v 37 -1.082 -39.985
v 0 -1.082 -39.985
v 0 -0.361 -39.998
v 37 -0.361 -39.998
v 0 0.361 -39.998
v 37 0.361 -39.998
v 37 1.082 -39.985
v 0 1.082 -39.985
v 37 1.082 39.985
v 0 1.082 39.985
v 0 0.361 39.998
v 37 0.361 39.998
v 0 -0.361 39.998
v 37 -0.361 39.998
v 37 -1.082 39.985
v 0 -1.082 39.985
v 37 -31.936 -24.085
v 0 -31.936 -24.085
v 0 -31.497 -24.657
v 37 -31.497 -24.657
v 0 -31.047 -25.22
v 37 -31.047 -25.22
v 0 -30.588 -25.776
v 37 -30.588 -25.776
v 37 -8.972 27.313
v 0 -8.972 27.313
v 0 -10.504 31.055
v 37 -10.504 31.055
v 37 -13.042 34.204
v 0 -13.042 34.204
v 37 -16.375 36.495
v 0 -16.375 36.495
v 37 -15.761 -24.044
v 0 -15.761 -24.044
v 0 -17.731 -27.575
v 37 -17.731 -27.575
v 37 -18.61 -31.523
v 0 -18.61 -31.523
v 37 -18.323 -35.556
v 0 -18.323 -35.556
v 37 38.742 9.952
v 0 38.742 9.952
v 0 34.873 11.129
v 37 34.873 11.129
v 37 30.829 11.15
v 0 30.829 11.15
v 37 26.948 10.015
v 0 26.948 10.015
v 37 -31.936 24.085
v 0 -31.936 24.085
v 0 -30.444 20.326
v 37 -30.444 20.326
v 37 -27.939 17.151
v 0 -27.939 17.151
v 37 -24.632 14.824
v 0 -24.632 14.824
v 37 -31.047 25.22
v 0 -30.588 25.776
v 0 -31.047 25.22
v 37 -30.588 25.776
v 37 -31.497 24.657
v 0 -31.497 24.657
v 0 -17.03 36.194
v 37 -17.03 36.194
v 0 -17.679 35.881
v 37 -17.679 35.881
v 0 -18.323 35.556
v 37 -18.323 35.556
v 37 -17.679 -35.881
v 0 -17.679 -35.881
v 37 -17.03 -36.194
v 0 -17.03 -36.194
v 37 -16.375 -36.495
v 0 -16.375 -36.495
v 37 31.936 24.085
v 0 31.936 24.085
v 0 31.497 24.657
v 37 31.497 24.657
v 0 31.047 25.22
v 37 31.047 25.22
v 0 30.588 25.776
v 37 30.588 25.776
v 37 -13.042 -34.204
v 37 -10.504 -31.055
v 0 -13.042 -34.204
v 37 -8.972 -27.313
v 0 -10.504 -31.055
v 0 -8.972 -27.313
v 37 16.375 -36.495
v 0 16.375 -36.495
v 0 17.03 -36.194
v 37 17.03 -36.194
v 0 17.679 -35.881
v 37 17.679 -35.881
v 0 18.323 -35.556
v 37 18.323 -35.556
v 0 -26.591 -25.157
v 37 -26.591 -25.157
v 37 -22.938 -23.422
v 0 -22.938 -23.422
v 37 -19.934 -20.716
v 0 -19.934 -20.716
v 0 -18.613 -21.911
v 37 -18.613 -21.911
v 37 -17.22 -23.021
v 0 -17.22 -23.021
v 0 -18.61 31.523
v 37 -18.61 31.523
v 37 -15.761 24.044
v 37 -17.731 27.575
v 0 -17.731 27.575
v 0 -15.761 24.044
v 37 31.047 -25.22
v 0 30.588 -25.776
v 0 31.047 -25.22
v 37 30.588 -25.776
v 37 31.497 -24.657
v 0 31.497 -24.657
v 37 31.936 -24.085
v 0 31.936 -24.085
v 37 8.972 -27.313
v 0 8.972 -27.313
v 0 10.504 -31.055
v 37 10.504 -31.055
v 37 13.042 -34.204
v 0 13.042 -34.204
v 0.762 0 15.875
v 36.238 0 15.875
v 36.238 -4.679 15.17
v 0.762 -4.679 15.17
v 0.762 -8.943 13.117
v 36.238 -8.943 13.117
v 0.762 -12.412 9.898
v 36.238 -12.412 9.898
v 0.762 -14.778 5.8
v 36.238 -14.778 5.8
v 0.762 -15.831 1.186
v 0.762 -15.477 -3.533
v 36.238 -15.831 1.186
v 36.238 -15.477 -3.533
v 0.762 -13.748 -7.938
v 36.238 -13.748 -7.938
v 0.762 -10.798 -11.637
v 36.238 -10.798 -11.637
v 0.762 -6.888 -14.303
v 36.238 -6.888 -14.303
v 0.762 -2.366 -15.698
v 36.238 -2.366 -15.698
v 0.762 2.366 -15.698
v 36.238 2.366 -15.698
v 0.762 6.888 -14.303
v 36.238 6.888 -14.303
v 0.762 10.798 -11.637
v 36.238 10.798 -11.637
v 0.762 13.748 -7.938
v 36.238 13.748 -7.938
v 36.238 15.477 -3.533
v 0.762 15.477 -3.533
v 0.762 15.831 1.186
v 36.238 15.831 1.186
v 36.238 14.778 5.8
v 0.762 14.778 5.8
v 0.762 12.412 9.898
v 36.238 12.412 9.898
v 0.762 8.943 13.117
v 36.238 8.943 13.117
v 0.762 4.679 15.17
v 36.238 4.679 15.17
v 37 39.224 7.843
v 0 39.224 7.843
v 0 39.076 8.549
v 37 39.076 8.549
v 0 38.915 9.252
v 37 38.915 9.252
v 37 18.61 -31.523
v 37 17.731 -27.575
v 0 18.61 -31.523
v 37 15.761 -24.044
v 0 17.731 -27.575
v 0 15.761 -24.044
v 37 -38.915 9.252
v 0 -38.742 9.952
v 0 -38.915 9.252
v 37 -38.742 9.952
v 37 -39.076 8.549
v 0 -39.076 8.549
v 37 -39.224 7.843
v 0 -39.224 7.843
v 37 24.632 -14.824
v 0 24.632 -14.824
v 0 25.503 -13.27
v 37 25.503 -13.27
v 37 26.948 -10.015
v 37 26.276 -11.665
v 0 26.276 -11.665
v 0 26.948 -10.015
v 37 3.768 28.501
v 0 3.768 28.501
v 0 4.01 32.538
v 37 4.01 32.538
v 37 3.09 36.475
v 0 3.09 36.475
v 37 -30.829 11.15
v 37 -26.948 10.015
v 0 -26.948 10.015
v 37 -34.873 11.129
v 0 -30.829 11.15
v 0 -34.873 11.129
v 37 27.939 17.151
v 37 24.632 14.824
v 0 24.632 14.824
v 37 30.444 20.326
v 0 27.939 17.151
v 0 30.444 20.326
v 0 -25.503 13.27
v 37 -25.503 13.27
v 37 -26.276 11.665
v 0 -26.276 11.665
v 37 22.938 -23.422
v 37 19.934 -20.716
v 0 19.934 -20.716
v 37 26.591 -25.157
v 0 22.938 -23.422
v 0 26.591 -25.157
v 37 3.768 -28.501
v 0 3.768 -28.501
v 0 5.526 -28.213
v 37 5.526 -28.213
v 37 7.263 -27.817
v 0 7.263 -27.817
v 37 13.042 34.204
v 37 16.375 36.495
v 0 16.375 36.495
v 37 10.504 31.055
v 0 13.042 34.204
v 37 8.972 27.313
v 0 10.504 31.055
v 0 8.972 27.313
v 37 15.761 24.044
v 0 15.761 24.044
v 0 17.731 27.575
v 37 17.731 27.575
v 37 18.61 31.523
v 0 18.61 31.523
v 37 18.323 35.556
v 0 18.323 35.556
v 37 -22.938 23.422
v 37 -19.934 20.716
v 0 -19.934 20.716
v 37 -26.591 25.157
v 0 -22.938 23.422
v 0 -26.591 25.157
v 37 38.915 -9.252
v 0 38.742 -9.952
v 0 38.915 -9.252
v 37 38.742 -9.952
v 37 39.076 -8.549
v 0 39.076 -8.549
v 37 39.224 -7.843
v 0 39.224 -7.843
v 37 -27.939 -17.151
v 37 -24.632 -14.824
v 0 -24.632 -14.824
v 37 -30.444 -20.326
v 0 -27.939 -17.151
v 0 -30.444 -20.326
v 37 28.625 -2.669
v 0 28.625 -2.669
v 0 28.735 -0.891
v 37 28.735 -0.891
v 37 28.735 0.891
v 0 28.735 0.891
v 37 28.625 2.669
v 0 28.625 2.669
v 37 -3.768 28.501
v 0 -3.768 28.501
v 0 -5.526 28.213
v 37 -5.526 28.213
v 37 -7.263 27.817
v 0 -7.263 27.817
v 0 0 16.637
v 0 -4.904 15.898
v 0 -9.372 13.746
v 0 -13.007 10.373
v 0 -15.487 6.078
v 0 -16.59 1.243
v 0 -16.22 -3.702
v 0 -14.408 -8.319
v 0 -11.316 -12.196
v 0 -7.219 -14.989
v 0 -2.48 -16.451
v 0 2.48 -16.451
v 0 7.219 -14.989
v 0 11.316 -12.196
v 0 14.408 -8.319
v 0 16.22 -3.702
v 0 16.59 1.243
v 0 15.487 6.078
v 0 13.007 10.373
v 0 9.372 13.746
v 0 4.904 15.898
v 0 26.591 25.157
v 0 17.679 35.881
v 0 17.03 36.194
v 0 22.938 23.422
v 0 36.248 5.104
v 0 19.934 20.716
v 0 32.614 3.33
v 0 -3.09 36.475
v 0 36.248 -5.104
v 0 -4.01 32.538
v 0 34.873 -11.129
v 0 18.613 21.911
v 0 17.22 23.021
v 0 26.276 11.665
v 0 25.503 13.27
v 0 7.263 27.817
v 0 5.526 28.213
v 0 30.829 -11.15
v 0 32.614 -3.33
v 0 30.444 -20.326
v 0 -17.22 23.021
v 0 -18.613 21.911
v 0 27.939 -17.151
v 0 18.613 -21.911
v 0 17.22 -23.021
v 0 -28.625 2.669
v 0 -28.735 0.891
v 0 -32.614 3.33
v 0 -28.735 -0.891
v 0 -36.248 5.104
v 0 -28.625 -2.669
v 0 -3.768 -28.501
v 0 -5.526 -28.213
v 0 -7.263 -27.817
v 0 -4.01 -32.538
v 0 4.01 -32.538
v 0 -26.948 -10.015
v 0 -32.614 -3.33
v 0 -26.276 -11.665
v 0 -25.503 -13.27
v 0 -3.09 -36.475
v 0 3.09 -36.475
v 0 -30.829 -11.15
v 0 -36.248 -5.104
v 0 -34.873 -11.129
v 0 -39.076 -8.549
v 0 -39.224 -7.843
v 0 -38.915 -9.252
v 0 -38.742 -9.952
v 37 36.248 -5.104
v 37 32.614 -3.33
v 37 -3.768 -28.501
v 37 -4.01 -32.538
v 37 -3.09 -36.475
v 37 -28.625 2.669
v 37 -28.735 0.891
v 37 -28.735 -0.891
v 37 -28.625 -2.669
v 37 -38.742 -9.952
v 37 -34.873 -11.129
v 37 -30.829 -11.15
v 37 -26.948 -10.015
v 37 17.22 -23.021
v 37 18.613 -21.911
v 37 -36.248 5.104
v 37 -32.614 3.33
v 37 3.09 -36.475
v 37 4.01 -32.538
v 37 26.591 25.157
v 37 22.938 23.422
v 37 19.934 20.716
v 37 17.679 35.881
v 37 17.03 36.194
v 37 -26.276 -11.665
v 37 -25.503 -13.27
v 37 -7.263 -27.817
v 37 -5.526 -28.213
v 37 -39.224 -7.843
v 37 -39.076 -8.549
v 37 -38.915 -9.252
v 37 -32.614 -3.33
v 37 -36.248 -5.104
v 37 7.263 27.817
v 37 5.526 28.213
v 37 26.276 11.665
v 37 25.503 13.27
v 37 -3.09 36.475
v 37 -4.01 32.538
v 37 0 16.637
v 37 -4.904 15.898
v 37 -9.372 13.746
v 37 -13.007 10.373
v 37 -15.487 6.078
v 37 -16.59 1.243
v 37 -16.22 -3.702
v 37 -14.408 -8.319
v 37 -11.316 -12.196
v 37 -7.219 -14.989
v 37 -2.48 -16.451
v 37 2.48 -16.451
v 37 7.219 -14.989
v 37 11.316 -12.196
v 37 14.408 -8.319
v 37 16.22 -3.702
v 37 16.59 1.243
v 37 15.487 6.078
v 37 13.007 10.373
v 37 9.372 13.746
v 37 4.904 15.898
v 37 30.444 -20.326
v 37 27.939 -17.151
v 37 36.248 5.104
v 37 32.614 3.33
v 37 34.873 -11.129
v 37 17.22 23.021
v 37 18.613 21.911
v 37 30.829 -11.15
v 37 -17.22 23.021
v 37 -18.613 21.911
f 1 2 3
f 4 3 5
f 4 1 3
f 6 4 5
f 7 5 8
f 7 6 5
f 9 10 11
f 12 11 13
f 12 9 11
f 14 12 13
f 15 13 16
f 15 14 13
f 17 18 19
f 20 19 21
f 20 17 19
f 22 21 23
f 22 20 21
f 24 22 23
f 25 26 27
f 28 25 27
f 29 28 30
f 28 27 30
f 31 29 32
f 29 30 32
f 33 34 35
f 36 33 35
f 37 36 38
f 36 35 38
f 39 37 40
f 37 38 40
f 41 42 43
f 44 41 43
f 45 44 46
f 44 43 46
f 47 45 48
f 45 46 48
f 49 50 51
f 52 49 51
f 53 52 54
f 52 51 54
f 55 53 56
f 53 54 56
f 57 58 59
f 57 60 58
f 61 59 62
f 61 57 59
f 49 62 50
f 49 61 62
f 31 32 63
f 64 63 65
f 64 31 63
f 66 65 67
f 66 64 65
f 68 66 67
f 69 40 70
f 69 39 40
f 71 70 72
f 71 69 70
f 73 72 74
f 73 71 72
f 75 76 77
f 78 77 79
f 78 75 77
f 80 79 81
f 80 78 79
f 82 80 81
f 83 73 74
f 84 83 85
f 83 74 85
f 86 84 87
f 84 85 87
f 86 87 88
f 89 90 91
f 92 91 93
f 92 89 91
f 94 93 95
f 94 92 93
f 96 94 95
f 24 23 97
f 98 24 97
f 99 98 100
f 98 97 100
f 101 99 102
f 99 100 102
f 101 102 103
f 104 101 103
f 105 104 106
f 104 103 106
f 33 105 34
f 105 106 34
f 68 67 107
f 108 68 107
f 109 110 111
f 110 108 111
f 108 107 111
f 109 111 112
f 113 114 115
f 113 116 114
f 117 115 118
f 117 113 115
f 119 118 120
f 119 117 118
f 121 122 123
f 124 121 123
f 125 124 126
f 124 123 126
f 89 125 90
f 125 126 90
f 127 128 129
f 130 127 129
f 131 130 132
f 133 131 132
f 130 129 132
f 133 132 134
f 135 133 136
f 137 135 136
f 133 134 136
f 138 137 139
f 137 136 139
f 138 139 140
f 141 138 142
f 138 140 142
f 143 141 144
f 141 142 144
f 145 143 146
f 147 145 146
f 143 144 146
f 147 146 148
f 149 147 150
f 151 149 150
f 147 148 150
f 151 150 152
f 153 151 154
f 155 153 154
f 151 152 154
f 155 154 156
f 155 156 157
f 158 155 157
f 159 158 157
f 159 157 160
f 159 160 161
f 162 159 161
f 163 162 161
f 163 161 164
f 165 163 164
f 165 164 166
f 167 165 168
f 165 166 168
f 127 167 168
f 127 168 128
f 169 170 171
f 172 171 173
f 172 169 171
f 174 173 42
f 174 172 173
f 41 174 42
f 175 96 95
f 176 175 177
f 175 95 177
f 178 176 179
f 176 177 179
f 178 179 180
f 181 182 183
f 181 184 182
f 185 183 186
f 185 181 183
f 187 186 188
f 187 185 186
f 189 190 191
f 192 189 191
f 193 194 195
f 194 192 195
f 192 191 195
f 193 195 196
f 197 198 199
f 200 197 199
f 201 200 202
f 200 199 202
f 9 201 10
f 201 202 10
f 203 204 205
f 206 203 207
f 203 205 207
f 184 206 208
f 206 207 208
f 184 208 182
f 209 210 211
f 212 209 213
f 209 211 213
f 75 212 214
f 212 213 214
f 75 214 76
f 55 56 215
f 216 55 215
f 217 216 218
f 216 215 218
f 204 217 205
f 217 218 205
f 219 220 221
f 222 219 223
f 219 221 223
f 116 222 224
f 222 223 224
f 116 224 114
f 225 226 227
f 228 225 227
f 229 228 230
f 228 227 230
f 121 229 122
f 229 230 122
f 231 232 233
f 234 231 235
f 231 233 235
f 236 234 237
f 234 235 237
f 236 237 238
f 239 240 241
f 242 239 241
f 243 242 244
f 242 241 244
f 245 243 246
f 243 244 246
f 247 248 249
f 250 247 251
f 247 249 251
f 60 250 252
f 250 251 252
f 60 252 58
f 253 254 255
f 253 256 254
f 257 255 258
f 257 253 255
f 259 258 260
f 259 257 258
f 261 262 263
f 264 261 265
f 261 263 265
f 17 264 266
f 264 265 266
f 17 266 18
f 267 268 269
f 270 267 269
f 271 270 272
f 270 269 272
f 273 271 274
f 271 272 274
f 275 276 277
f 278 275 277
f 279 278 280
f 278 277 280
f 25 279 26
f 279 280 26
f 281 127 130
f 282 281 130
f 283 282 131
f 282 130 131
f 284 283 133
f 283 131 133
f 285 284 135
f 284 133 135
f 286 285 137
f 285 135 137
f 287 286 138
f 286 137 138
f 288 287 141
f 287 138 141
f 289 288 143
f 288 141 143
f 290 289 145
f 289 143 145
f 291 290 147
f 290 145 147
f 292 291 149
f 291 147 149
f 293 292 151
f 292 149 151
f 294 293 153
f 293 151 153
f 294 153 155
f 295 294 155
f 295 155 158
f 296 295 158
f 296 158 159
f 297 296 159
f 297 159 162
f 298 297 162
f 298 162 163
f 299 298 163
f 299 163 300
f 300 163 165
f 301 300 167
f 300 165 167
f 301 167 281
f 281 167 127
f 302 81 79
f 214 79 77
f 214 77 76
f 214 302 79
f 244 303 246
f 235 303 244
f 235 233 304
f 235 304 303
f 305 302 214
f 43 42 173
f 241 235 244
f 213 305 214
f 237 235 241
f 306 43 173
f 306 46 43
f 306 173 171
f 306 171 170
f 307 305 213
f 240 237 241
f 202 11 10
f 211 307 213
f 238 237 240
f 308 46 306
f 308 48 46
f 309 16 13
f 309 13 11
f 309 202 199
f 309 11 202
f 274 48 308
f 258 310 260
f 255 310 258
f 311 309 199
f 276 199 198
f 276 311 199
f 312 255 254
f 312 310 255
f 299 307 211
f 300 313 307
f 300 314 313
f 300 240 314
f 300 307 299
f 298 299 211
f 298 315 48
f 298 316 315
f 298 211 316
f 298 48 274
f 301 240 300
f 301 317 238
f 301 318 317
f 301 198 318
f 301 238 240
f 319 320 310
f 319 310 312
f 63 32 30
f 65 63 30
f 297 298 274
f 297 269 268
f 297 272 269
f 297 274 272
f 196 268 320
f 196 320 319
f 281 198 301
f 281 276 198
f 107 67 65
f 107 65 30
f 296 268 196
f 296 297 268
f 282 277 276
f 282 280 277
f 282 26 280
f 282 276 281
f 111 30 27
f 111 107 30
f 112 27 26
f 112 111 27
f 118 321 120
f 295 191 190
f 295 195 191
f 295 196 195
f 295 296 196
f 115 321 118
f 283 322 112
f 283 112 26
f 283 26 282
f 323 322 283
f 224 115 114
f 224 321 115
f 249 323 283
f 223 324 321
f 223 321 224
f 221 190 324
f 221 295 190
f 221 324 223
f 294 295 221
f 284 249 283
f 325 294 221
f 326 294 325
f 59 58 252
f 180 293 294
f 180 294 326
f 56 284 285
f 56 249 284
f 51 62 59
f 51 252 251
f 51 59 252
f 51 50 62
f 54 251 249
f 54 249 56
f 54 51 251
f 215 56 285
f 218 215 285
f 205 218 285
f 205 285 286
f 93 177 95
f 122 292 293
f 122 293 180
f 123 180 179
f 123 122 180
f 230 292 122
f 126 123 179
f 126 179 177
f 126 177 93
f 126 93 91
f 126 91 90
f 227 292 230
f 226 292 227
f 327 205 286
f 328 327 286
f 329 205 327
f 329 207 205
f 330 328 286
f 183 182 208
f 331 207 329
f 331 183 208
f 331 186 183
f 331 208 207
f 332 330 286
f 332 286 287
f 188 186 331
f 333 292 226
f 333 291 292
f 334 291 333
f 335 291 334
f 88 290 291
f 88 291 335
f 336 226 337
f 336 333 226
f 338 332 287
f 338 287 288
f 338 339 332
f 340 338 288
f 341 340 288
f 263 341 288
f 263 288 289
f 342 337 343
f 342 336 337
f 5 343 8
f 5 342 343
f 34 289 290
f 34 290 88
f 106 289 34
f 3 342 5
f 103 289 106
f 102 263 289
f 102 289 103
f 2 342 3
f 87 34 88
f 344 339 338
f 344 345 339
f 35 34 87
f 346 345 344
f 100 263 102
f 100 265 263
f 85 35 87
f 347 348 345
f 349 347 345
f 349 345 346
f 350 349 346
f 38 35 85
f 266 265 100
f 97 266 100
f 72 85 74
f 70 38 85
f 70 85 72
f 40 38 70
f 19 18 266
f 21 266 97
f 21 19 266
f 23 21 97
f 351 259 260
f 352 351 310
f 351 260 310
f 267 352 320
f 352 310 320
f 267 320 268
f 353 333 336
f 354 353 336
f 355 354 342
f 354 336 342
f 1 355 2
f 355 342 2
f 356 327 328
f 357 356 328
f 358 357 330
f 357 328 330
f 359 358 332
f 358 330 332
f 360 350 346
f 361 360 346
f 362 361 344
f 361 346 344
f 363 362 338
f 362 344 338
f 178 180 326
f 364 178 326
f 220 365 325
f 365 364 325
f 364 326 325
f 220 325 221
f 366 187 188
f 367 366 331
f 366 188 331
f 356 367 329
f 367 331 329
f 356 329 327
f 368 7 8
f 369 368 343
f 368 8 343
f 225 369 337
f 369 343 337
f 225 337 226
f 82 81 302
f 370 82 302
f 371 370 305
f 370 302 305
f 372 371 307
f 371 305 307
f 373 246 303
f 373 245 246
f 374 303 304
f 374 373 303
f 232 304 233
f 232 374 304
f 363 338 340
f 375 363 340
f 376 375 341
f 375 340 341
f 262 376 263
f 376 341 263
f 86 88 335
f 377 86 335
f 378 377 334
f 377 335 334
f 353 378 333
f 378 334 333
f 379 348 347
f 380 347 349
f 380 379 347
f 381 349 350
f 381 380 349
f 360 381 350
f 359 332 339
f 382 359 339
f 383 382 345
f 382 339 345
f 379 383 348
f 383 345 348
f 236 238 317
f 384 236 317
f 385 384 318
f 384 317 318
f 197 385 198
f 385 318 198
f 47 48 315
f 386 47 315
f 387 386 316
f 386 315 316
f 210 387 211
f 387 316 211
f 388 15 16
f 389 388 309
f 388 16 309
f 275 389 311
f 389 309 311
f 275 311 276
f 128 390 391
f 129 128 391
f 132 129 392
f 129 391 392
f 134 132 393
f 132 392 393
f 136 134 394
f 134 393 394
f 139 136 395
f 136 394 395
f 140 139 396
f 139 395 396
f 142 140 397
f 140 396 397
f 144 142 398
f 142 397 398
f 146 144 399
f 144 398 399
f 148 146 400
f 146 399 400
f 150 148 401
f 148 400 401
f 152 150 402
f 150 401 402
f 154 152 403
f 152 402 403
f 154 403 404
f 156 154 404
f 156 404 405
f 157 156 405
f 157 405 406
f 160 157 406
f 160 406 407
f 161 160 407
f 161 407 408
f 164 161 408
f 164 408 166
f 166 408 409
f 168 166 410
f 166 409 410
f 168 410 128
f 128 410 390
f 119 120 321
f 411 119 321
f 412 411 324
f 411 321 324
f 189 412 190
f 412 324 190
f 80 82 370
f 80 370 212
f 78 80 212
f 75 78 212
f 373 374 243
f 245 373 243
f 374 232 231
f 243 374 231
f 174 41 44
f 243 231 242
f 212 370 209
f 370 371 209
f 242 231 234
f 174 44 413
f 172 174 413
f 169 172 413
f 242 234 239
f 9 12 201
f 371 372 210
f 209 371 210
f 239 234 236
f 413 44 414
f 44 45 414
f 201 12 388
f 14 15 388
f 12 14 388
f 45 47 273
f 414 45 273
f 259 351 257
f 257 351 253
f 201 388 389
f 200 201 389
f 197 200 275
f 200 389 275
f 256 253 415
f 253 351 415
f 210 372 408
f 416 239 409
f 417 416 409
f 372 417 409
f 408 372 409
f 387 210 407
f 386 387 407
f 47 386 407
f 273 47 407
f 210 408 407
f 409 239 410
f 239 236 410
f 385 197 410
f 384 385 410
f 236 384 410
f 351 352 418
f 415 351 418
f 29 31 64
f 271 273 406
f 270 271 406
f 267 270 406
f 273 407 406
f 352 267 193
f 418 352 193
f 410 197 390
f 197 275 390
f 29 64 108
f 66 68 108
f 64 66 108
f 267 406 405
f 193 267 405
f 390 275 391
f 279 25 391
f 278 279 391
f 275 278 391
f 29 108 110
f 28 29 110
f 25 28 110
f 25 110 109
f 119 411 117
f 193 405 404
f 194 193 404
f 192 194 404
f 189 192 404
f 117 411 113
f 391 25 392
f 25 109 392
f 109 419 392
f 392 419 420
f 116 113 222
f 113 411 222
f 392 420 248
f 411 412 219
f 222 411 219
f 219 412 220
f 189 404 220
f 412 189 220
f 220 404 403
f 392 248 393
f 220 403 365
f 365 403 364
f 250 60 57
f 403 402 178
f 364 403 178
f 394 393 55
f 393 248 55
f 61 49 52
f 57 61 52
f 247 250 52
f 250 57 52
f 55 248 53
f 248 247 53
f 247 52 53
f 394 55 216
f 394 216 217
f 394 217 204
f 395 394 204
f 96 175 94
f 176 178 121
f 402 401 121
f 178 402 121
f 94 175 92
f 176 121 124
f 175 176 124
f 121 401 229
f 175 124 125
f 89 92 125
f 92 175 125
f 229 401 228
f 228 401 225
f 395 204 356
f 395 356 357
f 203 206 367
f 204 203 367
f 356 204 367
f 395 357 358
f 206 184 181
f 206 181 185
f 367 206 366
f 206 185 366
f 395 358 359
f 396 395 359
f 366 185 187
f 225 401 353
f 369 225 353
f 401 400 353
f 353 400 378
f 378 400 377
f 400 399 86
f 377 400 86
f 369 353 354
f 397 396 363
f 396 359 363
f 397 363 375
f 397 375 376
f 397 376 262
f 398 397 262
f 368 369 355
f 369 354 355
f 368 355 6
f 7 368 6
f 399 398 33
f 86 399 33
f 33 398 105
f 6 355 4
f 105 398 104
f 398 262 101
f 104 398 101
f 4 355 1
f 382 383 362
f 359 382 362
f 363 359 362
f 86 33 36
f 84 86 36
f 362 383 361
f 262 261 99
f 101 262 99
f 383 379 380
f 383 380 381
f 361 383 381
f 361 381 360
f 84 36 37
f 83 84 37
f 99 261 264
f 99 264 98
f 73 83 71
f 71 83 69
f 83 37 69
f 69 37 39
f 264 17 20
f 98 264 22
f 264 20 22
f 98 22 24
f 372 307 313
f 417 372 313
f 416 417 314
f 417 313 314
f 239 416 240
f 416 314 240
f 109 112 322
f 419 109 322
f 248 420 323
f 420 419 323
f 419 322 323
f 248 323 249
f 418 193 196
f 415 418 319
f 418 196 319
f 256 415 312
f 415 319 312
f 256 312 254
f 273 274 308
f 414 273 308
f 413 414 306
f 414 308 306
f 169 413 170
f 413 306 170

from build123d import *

# Parameters (mm, degrees)
BASPROSKE_W     = 37
BASPROSKE_H     = 40
TOOTHCUT_DEPTH  = 68.594378464
TEETHCUTS_COUNT = 14
TEETHCUTS_ANGLE = 334.285714286
BORSKE_R        = 15.875
BORE_DEPTH      = 50.000508
CHAMFER1_SIZE   = 0.762


with BuildPart() as part:
    # BasProSke → Base-Revolve (revolve)
    with BuildSketch(Plane(origin=(0, 0, 0), x_dir=(1, 0, 0), z_dir=(0, 1, 0)), mode=Mode.PRIVATE) as base_revolve_sk:
        with Locations((18.5, 20)):
            Rectangle(BASPROSKE_W, BASPROSKE_H)
    revolve(base_revolve_sk.sketch.rotate(Axis((-10, 0, 0), (1, 0, 0)), 180), axis=Axis((-10, 0, 0), (1, 0, 0)))

    # TooCutSke → ToothCut (cut, through all)
    with BuildSketch(Plane(origin=(0, 0, 0), x_dir=(0, 0, -1), z_dir=(1, 0, 0))):
        with BuildLine():
            ThreePointArc((2.668955068, 28.624843752), (0, 28.749), (-2.668955068, 28.624843752))
            ThreePointArc((-2.668955068, 28.624843752), (-4.15928171, 34.644525037), (-8.103646746, 39.429879856))
            ThreePointArc((-8.103646746, 39.429879856), (0, 40.254), (8.103646746, 39.429879856))
            ThreePointArc((8.103646746, 39.429879856), (4.15928171, 34.644525037), (2.668955068, 28.624843752))
        make_face()
    toothcut = extrude(amount=TOOTHCUT_DEPTH, mode=Mode.SUBTRACT)

    # TeethCuts: ToothCut ×14 about axis
    teethcuts_axis = Axis((-10, 0, 0), (1, 0, 0))
    for i in range(1, TEETHCUTS_COUNT):
        add(toothcut.rotate(teethcuts_axis, i * TEETHCUTS_ANGLE / (TEETHCUTS_COUNT - 1)), mode=Mode.SUBTRACT)

    # BorSke → Bore (cut, symmetric)
    with BuildSketch(Plane(origin=(0, 0, 0), x_dir=(0, 0, -1), z_dir=(1, 0, 0))):
        with Locations(Location((0, 0, 0), (0, 0, 180))):
            Circle(BORSKE_R)
    extrude(amount=BORE_DEPTH, both=True, mode=Mode.SUBTRACT)

    # Chamfer1
    chamfer1_edges = [part.edges().sort_by_distance(p)[0] for p in [
        (37, 0, -15.875),
        (0, 0, -15.875),
    ]]
    chamfer(chamfer1_edges, length=CHAMFER1_SIZE)


solid = part.part
